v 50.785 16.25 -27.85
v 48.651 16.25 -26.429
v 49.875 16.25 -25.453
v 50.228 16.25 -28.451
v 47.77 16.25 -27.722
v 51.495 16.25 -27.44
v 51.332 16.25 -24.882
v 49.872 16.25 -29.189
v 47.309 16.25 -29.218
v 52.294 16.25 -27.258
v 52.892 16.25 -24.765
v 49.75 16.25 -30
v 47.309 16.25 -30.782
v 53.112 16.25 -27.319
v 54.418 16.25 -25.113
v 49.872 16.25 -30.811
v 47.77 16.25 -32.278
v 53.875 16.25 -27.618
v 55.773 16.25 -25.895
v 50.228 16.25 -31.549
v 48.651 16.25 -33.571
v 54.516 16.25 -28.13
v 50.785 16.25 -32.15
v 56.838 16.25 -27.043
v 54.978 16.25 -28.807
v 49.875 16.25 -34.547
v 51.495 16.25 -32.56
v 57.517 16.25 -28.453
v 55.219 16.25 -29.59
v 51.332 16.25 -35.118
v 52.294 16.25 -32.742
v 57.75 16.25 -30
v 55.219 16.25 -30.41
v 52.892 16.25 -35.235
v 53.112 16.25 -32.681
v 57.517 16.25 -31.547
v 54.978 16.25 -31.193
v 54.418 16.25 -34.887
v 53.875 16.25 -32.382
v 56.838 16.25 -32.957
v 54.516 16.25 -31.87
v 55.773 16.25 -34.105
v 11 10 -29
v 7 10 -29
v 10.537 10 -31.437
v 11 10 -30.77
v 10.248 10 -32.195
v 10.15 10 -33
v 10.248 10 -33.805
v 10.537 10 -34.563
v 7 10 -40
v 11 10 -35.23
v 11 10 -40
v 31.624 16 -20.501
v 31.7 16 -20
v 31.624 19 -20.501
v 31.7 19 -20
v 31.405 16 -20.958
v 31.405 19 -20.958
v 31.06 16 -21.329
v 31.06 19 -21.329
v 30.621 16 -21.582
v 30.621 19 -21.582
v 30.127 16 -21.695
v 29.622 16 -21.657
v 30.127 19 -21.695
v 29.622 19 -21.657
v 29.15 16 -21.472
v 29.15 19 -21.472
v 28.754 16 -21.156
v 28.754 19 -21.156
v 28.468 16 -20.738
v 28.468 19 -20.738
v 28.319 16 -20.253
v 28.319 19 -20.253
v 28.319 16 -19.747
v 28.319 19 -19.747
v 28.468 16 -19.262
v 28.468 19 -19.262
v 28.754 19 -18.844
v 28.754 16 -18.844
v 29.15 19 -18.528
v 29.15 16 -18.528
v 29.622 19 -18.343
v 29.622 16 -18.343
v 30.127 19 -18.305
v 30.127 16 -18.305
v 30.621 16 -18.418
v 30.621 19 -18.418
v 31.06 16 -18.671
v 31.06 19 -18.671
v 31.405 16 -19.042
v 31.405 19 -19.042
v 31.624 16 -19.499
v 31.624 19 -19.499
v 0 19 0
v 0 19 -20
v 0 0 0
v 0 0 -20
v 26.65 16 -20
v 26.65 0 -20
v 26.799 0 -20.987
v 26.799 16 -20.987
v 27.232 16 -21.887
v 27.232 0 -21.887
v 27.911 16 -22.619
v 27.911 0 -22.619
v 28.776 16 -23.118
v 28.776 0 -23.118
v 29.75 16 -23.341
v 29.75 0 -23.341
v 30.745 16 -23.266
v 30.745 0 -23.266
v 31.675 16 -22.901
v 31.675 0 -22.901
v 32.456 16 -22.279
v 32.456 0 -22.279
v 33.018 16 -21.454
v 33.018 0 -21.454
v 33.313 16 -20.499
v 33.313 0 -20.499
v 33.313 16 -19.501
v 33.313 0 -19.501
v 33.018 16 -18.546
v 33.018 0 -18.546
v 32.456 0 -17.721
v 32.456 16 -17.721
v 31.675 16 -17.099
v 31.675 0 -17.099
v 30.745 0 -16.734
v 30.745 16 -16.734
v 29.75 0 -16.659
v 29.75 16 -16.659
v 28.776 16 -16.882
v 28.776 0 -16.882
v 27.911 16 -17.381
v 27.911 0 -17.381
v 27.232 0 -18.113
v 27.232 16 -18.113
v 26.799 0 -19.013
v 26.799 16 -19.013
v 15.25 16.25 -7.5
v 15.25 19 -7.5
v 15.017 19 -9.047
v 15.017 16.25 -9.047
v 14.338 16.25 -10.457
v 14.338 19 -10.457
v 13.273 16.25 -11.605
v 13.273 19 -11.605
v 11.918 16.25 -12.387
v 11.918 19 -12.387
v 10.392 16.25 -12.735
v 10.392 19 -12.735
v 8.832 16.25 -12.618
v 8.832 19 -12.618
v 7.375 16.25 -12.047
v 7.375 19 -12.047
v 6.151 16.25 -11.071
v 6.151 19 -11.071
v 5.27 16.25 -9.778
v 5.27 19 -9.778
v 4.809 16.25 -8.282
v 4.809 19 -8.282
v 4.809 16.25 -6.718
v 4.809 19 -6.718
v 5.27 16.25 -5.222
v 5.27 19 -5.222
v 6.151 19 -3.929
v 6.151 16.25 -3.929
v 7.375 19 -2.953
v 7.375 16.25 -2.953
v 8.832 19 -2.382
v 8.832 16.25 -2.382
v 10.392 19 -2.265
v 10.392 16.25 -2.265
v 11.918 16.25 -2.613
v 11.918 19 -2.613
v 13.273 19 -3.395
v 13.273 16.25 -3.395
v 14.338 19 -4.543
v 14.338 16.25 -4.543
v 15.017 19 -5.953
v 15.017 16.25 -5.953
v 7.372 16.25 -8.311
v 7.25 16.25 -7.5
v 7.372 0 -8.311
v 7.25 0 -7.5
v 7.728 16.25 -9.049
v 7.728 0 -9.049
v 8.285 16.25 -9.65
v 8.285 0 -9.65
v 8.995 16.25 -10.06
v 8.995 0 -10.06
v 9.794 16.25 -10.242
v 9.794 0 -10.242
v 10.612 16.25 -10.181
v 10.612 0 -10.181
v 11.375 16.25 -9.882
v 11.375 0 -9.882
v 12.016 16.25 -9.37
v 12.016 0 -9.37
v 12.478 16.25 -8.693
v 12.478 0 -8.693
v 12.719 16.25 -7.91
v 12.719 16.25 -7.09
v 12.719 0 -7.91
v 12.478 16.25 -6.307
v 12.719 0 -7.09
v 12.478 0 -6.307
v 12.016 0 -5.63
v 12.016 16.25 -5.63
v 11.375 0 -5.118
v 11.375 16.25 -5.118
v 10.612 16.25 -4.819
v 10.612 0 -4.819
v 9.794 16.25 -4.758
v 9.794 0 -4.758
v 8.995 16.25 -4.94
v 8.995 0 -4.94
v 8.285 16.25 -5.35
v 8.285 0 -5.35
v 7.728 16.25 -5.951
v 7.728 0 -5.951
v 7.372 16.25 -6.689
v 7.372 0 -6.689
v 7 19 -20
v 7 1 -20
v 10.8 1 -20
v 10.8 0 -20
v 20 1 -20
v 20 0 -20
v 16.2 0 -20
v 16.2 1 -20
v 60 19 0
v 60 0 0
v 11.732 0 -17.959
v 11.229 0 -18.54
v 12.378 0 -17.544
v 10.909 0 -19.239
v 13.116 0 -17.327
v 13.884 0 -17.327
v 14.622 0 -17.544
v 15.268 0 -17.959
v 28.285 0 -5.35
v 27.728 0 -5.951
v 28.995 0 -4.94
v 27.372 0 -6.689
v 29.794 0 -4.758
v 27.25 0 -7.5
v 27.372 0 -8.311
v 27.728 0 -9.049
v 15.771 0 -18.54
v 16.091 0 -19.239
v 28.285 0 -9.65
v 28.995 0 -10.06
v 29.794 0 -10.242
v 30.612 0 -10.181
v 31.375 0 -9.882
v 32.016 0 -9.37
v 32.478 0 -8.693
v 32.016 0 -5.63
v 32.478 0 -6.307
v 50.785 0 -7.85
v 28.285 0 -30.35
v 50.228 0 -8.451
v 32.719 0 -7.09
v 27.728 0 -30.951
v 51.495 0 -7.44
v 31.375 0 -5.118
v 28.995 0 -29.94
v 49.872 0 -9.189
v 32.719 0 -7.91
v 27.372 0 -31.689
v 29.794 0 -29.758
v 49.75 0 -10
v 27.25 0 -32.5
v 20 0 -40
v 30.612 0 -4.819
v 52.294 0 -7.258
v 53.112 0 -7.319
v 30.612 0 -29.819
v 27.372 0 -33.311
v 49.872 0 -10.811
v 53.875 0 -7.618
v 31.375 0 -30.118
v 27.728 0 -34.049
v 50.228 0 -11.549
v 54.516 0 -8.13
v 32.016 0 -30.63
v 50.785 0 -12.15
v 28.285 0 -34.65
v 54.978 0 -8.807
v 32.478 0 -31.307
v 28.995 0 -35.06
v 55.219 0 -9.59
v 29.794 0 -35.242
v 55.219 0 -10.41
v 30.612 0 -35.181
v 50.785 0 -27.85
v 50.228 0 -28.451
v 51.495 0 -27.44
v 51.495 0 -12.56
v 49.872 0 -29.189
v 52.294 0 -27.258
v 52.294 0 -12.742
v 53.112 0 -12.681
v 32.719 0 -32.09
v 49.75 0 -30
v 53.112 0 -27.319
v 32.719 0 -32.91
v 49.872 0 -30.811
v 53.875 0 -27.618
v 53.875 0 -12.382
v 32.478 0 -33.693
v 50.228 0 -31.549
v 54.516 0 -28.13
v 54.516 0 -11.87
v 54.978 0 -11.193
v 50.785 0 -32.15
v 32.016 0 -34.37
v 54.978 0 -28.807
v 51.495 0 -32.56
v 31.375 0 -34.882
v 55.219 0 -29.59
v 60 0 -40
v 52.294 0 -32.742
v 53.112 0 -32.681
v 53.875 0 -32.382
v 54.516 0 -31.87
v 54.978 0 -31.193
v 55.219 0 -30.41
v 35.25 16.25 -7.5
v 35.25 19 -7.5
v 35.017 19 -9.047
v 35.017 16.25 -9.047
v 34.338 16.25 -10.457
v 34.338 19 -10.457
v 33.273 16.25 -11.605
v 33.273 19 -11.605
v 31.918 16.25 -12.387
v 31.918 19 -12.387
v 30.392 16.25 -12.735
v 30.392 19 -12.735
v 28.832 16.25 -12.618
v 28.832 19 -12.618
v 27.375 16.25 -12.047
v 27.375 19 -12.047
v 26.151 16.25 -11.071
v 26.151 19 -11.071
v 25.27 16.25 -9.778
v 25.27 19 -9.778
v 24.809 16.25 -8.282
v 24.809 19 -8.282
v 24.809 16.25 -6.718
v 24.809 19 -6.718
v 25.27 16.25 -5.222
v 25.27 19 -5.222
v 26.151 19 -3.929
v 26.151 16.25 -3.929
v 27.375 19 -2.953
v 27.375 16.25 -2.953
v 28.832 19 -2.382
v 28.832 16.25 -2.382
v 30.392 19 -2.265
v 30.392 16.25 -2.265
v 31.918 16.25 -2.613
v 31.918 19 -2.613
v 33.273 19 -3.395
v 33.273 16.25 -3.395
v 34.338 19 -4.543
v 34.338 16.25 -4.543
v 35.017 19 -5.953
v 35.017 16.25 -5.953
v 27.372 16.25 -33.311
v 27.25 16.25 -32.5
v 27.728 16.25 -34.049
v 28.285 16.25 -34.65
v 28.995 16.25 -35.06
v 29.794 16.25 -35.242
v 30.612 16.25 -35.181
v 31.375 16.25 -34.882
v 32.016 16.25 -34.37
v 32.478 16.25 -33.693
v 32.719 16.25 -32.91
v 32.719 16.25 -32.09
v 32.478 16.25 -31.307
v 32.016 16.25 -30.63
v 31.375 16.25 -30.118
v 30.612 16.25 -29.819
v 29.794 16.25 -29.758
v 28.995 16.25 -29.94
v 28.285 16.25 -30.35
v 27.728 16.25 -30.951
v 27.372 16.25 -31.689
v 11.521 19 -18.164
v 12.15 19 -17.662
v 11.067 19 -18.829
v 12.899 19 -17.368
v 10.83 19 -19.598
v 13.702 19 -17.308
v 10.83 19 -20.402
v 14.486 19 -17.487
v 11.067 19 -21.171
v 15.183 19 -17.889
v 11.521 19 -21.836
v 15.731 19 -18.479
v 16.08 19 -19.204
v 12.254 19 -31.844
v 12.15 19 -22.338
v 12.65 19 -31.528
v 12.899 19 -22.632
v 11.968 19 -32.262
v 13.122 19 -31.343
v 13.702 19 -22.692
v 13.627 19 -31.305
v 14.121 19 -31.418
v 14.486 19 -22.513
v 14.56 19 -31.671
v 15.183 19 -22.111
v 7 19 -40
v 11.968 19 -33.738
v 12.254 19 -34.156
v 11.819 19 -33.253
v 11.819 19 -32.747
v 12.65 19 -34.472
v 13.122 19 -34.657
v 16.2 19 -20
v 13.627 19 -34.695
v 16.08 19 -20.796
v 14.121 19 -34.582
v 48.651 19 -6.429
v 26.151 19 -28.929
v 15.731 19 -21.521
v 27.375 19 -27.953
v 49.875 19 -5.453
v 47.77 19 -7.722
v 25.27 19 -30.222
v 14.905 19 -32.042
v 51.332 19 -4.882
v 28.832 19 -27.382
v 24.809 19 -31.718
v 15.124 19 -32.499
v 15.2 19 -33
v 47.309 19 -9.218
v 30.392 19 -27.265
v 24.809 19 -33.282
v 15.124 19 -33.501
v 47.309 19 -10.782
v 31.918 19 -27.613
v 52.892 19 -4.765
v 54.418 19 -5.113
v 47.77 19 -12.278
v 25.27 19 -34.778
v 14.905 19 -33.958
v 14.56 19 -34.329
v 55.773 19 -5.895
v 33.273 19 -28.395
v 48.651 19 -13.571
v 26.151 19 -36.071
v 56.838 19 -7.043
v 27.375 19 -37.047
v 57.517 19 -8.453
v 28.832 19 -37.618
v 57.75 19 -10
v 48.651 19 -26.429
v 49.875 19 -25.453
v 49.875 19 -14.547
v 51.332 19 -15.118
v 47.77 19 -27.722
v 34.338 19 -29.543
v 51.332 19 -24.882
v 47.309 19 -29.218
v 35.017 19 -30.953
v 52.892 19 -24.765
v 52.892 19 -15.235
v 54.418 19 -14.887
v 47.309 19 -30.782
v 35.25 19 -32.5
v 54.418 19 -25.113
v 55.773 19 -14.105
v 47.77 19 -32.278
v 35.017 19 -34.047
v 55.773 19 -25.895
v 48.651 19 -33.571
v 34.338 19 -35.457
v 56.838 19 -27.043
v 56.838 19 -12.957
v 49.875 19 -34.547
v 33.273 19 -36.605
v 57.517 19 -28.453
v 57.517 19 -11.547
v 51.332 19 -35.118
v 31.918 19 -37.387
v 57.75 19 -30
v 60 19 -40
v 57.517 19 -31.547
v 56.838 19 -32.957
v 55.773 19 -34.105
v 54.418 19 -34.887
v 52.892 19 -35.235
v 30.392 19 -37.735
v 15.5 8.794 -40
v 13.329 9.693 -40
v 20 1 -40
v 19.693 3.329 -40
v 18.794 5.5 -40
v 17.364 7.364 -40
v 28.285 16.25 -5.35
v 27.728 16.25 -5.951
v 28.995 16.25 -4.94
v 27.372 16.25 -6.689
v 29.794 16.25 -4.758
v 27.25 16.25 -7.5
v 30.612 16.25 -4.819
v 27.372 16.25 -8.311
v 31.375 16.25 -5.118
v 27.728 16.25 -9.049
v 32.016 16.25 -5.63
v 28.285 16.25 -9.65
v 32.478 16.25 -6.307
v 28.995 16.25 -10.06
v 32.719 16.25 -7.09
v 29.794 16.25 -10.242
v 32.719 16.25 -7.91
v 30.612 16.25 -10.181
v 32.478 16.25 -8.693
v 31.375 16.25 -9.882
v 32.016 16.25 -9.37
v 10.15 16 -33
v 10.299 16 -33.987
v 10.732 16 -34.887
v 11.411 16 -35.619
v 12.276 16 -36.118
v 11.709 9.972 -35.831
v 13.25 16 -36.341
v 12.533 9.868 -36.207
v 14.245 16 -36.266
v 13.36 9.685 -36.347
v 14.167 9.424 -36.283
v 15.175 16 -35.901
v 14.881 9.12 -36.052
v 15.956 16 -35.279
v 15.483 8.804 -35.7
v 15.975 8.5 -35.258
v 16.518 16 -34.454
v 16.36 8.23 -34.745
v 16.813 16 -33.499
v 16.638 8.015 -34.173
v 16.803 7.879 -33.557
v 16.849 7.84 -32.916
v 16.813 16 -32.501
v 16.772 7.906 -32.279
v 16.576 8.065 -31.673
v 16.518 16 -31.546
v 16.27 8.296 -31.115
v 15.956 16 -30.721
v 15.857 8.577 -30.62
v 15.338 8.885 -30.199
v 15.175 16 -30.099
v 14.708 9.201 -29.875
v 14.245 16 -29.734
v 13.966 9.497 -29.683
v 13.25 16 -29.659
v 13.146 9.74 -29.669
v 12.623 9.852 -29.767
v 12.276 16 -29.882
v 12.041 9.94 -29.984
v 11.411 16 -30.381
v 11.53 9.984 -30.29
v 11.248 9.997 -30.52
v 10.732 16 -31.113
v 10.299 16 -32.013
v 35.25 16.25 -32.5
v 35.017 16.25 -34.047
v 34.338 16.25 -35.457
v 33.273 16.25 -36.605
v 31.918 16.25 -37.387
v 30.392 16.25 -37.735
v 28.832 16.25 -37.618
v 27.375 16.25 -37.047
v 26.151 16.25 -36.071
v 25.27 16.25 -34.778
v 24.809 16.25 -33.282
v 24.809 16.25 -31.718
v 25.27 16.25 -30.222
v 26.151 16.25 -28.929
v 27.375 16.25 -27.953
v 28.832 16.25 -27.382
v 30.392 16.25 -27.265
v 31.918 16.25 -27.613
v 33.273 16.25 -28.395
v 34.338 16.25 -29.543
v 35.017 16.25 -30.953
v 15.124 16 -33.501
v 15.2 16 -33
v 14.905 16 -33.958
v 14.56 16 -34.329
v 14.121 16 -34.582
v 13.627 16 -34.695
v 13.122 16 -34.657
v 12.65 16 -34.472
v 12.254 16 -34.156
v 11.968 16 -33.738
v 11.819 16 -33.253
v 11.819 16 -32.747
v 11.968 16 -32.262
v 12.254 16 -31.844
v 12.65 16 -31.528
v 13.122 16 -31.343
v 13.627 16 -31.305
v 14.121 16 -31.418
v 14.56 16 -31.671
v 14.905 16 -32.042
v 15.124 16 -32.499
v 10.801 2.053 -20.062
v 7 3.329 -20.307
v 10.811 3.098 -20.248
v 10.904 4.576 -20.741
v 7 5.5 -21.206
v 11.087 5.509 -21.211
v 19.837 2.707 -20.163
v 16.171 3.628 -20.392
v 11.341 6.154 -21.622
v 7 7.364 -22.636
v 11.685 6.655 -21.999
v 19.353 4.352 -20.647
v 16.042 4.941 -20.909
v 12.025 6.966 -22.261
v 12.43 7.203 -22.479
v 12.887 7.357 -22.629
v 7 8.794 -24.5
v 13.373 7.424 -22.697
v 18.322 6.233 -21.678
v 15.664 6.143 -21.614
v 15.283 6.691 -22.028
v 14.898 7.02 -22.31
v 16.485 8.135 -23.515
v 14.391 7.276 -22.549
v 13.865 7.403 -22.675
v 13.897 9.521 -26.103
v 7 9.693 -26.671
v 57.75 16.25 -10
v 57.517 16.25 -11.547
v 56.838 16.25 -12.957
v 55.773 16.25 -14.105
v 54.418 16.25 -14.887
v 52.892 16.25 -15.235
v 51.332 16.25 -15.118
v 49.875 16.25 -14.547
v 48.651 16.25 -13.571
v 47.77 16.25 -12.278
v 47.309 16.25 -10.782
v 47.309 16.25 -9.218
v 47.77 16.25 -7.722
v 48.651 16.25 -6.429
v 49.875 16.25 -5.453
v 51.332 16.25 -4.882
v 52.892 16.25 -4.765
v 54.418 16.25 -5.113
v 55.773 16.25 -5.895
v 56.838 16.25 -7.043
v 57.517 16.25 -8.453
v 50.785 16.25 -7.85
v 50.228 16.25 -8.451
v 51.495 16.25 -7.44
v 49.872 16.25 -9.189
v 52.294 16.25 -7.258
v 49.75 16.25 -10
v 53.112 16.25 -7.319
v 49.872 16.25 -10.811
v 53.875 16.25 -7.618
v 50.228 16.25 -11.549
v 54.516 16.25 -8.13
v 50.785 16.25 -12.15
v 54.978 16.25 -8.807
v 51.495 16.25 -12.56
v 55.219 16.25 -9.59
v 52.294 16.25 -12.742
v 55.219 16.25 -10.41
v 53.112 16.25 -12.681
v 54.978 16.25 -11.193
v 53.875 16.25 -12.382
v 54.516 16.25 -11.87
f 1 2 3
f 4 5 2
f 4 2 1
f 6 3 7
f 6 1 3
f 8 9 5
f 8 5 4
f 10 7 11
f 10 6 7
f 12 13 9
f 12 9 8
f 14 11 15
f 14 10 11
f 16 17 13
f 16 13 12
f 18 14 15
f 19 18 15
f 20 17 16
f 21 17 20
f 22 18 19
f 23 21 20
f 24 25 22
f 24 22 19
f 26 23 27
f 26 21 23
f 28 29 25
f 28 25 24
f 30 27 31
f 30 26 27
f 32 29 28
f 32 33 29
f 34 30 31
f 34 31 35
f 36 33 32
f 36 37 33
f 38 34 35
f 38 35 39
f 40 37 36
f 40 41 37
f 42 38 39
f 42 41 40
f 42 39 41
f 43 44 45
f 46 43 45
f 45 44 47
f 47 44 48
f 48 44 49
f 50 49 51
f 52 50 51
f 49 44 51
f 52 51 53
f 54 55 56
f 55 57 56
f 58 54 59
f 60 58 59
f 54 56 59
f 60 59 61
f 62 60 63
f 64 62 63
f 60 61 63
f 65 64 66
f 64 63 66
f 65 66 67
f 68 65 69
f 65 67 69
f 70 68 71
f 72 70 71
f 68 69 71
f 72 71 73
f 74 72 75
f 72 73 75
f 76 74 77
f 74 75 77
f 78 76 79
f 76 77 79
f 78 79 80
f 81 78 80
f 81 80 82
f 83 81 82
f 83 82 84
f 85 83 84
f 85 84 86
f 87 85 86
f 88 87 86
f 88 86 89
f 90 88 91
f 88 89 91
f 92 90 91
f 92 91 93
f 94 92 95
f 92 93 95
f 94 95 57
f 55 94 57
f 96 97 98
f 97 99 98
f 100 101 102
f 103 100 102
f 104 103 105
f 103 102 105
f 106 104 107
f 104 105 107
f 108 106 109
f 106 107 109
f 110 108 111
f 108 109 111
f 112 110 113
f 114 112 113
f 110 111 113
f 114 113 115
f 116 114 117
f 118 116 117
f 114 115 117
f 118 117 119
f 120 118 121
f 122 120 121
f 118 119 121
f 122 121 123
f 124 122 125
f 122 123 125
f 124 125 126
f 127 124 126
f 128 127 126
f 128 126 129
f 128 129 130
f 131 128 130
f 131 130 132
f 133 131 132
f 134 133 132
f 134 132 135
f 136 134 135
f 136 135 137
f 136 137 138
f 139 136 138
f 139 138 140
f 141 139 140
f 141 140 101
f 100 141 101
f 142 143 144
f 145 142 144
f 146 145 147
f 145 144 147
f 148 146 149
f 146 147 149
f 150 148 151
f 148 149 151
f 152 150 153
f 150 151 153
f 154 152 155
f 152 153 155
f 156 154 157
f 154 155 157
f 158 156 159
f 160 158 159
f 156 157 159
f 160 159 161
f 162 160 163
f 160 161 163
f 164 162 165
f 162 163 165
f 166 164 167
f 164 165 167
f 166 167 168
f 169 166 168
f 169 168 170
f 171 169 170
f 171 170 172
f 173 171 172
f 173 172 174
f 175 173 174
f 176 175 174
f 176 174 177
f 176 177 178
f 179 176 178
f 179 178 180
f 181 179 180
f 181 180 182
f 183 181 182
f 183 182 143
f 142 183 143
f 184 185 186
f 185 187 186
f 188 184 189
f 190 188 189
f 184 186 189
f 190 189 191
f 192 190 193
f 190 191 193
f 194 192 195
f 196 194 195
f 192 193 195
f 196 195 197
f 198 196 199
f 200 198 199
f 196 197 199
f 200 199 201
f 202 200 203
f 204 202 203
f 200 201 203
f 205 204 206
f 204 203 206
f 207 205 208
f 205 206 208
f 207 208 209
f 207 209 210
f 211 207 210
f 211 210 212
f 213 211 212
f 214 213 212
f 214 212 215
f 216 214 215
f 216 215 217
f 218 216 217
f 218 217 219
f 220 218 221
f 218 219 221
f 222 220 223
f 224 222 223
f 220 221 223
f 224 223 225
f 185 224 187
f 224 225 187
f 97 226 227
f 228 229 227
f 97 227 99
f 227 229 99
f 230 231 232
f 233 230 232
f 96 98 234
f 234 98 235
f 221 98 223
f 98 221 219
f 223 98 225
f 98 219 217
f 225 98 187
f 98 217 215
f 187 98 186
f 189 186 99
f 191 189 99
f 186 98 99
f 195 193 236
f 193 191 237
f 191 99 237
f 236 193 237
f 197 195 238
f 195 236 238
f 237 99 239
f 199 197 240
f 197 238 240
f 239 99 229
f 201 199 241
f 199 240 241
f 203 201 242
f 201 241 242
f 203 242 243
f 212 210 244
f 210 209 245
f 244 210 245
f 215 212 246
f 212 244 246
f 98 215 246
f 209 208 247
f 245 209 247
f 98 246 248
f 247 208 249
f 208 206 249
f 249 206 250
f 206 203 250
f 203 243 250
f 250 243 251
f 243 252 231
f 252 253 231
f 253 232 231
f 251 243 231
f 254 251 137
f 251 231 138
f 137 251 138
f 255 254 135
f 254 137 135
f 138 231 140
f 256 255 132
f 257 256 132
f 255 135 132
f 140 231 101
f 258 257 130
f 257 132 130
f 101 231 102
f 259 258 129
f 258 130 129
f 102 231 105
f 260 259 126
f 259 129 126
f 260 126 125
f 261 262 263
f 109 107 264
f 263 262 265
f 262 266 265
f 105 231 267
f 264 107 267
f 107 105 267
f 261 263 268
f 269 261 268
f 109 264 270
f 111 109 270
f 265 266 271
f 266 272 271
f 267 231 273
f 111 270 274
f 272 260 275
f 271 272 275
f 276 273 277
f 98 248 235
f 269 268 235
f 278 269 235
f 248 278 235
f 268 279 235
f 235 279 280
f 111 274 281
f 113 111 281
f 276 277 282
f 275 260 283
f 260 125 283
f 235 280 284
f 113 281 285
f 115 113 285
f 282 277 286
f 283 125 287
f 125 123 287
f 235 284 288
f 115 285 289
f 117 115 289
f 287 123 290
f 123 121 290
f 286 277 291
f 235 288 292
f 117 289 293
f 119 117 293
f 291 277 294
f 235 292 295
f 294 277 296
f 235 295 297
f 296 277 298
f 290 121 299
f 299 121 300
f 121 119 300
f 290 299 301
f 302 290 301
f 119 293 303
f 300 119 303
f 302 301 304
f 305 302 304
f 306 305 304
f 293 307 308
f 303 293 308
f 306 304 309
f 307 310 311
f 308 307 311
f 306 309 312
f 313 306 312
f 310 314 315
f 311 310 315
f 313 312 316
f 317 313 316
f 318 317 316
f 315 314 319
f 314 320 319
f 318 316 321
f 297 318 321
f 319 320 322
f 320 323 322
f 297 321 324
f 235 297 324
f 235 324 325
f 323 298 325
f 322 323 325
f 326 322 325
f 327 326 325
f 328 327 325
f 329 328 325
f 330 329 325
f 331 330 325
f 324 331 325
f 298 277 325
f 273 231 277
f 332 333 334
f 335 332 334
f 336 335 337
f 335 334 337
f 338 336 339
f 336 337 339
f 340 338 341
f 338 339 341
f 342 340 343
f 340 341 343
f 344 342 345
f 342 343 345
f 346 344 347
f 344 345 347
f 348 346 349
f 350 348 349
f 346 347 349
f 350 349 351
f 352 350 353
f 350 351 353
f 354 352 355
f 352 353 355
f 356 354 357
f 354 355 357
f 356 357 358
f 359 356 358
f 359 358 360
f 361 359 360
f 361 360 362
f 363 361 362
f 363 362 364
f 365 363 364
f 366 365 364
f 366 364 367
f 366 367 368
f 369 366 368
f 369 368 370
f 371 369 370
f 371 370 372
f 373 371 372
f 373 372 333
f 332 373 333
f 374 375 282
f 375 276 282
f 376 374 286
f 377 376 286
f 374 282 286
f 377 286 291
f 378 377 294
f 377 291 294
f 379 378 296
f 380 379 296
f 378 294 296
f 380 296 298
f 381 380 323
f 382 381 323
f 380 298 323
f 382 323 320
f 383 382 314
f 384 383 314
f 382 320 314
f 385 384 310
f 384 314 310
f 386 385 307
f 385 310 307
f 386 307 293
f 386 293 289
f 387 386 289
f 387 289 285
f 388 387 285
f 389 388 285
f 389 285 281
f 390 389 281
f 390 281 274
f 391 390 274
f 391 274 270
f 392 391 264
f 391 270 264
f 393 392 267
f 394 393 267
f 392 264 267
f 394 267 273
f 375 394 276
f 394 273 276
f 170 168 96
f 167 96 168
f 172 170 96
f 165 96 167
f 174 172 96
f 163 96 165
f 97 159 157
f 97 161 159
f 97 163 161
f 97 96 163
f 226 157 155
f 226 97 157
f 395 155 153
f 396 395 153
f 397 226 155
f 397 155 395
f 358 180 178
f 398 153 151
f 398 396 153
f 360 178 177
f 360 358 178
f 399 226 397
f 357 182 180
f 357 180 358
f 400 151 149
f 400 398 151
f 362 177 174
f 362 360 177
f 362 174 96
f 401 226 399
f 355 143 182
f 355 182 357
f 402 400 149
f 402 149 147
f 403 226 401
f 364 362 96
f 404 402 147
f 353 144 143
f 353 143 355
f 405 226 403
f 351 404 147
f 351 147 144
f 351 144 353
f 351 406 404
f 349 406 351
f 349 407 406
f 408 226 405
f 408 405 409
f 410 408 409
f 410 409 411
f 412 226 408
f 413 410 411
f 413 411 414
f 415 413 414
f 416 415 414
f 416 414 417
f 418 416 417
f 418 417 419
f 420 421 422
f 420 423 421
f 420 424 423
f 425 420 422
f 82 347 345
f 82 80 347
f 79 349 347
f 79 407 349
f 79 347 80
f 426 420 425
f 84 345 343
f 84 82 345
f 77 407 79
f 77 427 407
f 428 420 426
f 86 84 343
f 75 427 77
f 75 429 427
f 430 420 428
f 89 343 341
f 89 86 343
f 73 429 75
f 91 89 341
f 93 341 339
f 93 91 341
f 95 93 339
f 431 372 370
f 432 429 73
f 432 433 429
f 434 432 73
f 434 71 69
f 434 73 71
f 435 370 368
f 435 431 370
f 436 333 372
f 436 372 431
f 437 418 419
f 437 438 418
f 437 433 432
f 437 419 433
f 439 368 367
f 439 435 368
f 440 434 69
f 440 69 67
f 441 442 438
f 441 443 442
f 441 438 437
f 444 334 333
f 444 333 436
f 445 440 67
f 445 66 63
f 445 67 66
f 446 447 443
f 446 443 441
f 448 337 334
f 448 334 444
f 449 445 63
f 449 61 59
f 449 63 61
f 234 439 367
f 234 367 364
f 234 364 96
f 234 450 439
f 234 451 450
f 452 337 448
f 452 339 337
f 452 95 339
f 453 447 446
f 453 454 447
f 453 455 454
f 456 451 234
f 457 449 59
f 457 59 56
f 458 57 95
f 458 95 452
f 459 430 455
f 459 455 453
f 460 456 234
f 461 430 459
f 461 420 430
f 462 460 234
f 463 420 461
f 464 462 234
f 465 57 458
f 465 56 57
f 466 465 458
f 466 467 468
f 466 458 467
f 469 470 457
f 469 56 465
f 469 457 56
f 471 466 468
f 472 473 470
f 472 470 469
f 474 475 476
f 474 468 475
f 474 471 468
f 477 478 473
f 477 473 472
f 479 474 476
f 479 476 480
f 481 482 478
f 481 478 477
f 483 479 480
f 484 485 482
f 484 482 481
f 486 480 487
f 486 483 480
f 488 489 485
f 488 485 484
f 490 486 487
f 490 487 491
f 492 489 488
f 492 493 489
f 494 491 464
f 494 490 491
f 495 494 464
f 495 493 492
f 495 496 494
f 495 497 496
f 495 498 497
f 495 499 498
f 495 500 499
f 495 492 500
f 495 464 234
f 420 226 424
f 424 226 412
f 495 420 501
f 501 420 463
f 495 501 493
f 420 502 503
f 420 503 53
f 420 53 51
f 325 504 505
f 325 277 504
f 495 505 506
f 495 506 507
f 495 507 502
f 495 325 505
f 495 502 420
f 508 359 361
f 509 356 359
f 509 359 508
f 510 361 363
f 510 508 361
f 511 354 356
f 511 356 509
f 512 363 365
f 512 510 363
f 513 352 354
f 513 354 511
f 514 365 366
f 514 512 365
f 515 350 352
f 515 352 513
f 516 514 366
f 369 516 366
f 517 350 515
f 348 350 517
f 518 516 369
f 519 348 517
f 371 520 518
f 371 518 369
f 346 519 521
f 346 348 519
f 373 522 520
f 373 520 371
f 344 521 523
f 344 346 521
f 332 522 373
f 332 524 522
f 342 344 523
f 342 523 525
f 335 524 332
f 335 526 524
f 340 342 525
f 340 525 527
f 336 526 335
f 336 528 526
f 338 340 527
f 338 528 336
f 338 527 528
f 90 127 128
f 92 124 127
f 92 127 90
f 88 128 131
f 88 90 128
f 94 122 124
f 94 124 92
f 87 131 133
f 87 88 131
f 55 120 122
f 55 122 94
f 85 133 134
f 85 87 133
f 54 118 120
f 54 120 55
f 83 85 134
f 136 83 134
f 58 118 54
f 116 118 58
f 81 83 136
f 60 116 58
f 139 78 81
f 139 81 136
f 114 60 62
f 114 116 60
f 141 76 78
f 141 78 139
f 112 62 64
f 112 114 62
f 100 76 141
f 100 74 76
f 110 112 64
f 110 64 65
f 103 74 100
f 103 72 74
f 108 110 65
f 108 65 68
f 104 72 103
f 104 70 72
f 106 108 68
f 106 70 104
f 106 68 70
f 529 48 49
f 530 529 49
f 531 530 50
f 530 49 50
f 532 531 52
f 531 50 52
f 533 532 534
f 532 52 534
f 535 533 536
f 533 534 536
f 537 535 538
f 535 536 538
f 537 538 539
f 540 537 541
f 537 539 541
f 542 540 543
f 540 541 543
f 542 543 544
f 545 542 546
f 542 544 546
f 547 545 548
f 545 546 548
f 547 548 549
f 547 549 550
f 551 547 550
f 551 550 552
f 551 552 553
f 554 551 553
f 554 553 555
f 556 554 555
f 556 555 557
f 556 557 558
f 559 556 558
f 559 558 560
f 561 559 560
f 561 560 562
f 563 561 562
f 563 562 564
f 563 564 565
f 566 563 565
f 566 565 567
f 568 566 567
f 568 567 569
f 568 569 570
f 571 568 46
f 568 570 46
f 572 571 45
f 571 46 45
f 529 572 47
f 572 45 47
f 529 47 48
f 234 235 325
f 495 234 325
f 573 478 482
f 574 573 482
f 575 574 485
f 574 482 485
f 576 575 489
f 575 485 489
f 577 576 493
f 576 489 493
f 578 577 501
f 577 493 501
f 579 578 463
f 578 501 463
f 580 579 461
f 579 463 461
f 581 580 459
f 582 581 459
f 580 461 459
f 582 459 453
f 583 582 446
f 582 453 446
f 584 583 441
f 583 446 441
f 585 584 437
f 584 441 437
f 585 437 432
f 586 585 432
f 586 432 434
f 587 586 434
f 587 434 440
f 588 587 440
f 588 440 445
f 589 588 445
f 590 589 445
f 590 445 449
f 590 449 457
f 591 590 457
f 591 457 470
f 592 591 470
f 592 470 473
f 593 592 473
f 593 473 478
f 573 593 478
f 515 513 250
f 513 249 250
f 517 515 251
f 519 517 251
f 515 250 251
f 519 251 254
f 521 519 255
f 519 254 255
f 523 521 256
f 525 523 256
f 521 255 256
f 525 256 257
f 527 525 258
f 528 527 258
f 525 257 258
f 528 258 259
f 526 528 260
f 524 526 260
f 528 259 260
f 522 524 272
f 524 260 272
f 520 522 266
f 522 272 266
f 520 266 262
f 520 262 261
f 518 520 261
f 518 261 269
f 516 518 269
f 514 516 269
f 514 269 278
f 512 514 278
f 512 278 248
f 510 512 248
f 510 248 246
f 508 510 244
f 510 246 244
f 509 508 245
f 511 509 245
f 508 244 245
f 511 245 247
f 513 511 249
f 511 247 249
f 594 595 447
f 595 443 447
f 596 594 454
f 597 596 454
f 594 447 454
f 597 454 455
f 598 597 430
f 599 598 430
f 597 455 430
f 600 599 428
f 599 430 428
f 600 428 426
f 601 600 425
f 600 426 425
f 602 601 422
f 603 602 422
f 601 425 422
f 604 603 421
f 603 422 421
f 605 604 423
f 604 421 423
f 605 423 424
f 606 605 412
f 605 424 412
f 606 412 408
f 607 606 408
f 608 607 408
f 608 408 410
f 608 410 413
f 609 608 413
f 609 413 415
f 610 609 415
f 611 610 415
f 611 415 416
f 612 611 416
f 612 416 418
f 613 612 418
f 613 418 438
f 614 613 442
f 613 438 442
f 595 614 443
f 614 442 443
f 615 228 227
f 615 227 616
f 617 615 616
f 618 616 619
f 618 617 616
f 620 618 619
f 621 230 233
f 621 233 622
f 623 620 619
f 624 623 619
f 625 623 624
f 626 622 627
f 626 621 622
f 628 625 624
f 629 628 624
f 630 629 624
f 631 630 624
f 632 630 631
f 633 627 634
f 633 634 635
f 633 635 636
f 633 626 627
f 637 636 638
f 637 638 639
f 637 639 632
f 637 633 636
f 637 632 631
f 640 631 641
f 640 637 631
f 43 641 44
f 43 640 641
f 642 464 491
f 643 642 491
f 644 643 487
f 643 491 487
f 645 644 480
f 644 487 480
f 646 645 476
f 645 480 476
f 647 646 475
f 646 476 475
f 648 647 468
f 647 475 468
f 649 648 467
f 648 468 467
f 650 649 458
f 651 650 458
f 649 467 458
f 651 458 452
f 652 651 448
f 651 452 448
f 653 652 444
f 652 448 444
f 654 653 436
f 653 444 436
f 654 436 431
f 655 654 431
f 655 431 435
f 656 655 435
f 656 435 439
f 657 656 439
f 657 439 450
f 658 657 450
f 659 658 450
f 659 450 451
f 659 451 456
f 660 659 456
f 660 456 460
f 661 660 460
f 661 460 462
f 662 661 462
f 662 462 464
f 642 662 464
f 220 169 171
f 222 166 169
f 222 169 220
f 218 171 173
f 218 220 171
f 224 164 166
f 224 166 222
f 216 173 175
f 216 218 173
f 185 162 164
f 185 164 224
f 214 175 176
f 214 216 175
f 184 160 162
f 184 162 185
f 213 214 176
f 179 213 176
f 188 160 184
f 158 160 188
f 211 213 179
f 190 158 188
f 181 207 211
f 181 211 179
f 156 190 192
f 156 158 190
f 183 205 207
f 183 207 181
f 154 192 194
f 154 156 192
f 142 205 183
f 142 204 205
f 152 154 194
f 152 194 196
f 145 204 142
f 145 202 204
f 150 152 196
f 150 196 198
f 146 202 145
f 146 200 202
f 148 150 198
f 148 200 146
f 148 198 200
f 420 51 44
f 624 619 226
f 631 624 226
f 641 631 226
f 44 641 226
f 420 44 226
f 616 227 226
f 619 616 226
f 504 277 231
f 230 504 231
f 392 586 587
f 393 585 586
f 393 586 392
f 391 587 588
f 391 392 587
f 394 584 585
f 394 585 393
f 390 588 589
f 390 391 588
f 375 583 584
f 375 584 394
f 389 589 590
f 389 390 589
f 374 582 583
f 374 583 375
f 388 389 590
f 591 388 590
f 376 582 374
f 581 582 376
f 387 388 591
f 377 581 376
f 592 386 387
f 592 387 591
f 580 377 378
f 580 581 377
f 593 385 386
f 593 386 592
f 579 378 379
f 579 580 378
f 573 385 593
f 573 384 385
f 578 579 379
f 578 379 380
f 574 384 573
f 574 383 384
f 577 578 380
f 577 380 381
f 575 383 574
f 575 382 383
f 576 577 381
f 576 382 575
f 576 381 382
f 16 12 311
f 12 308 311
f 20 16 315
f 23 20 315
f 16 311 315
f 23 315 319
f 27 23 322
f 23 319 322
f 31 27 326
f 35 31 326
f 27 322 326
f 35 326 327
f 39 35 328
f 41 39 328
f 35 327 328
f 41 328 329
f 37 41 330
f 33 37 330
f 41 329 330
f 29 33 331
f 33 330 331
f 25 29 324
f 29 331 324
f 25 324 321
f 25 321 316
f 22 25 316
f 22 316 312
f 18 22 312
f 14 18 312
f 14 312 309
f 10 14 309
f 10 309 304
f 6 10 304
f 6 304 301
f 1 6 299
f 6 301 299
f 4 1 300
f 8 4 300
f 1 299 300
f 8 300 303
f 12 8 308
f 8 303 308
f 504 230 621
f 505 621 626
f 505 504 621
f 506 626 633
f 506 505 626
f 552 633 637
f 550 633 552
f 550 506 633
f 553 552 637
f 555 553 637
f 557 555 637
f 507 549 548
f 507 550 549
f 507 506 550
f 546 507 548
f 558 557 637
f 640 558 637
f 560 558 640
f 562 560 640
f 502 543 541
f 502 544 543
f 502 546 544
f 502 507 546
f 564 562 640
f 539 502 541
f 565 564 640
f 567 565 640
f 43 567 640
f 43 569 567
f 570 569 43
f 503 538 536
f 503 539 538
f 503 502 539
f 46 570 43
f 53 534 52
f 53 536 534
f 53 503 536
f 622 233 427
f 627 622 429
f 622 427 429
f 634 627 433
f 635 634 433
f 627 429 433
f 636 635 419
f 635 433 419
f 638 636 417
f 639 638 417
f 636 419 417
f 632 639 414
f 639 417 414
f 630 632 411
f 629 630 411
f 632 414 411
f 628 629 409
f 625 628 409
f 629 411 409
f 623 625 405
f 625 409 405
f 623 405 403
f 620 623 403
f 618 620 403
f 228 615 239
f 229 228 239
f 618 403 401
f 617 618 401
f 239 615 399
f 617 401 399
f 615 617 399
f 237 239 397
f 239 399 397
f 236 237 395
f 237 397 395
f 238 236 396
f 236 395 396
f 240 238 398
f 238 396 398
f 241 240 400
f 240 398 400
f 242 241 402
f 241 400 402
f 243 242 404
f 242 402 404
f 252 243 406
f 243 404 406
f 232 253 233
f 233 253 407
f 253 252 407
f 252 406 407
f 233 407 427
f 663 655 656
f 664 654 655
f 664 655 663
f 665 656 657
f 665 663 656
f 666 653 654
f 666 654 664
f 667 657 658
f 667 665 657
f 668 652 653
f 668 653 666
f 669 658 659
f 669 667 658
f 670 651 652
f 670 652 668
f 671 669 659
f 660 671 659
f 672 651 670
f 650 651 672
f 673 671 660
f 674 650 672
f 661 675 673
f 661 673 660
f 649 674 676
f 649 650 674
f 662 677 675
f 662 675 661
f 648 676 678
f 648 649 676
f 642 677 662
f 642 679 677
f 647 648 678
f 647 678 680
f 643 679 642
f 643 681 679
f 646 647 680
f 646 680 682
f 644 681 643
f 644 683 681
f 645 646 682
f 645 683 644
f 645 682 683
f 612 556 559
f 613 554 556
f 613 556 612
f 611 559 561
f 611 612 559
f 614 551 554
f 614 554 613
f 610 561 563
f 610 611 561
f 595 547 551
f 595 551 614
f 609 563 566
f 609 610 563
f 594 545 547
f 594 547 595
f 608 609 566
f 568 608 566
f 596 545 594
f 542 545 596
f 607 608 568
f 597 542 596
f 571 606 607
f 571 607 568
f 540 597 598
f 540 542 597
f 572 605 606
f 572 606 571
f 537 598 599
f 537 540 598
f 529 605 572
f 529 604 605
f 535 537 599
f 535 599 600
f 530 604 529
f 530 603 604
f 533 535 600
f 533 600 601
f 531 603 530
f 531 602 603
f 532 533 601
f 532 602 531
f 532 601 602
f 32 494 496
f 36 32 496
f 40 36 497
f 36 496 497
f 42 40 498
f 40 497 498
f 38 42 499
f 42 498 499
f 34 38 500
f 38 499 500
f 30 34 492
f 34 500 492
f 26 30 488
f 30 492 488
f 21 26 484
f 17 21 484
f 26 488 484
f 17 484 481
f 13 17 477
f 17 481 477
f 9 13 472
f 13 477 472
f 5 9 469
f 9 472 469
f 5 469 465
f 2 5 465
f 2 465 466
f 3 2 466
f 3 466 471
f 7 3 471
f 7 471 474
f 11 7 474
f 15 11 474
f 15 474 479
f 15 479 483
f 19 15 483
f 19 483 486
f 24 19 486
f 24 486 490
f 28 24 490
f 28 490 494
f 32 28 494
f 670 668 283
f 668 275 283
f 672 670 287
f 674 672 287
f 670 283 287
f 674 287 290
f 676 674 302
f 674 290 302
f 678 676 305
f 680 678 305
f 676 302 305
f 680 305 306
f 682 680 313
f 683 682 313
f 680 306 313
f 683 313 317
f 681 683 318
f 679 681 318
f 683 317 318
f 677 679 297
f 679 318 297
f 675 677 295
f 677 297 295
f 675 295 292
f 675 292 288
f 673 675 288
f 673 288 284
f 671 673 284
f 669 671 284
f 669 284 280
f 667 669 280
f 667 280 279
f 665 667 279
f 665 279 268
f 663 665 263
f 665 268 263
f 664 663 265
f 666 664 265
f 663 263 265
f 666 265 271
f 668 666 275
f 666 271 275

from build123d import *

# Parameters (mm, degrees)
BOSS_EXTRUDE1_DEPTH             = 10
BOSS_EXTRUDE2_DEPTH             = 9
CBORE_FOR_M5_SBHCS1_D           = 5.5
CBORE_FOR_M5_SBHCS1_CBORE_D     = 10.5
CBORE_FOR_M5_SBHCS1_CBORE_DEPTH = 2.75
CBORE_FOR_M5_SBHCS2_D           = 5.5
CBORE_FOR_M5_SBHCS2_CBORE_D     = 10.5
CBORE_FOR_M5_SBHCS2_CBORE_DEPTH = 2.75
CBORE_FOR_M3_SBHCS1_D           = 3.4
CBORE_FOR_M3_SBHCS1_CBORE_D     = 6.7
CBORE_FOR_M3_SBHCS1_CBORE_DEPTH = 16
CBORE_FOR_M3_SBHCS2_D           = 3.4
CBORE_FOR_M3_SBHCS2_CBORE_D     = 6.7
CBORE_FOR_M3_SBHCS2_CBORE_DEPTH = 6
F_5_4_5_4_DIAMETER_HOLE1_D      = 5.4
FILLET3_R                       = 9


with BuildPart() as part:
    # Sketch1 → Boss-Extrude1 (new body)
    with BuildSketch(Plane(origin=(0, 0, 0), x_dir=(1, 0, 0), z_dir=(0, 1, 0))):
        Polygon((0, 0), (60, 0), (60, 40), (20, 40), (20, 20), (0, 20), align=None)
    extrude(amount=BOSS_EXTRUDE1_DEPTH)

    # Sketch2 → Boss-Extrude2 (add)
    with BuildSketch(Plane(origin=(0, 10, 0), x_dir=(1, 0, 0), z_dir=(0, 1, 0))):
        Polygon((20, 40), (7, 40), (7, 20), (0, 20), (0, 0), (60, 0), (60, 40), align=None)
    extrude(amount=BOSS_EXTRUDE2_DEPTH)

    # CBORE for M5 SBHCS1 (through all)
    with Locations(Plane(origin=(0, 19, 0), x_dir=(1, 0, 0), z_dir=(0, 1, 0))):
        with Locations((10, 7.5), (30, 7.5), (30, 32.5)):
            CounterBoreHole(CBORE_FOR_M5_SBHCS1_D / 2, CBORE_FOR_M5_SBHCS1_CBORE_D / 2, CBORE_FOR_M5_SBHCS1_CBORE_DEPTH)

    # CBORE for M5 SBHCS2 (through all)
    with Locations(Plane(origin=(0, 19, 0), x_dir=(1, 0, 0), z_dir=(0, 1, 0))):
        with Locations((52.5, 30), (52.5, 10)):
            CounterBoreHole(CBORE_FOR_M5_SBHCS2_D / 2, CBORE_FOR_M5_SBHCS2_CBORE_D / 2, CBORE_FOR_M5_SBHCS2_CBORE_DEPTH)

    # CBORE for M3 SBHCS1 (through all)
    with Locations(Plane(origin=(0, 0, 0), x_dir=(-1, 0, 0), z_dir=(0, -1, 0))):
        with Locations((-30, 20)):
            CounterBoreHole(CBORE_FOR_M3_SBHCS1_D / 2, CBORE_FOR_M3_SBHCS1_CBORE_D / 2, CBORE_FOR_M3_SBHCS1_CBORE_DEPTH)

    # CBORE for M3 SBHCS2 (through all)
    with Locations(Plane(origin=(0, 10, 0), x_dir=(-1, 0, 0), z_dir=(0, -1, 0))):
        with Locations((-13.5, 33)):
            CounterBoreHole(CBORE_FOR_M3_SBHCS2_D / 2, CBORE_FOR_M3_SBHCS2_CBORE_D / 2, CBORE_FOR_M3_SBHCS2_CBORE_DEPTH)

    # Ø5.4 (5.4) Diameter Hole1 (through all)
    with Locations(Plane(origin=(0, 0, 0), x_dir=(-1, 0, 0), z_dir=(0, -1, 0))):
        with Locations((-13.5, 20)):
            Hole(F_5_4_5_4_DIAMETER_HOLE1_D / 2)

    # Fillet3
    # the kernel refuses this fillet: 9 mm, written as the material it adds along each edge
    with BuildSketch(Plane(origin=(20, 10, -40), x_dir=(0, -1, 0), z_dir=(0, 0, 1))) as fillet3_piece_1_section:
        with BuildLine():
            CenterArc((FILLET3_R, -FILLET3_R), FILLET3_R, 90, 90)
            Line((0, -FILLET3_R), (0, 0))
            Line((0, 0), (FILLET3_R, 0))
        make_face()
    fillet3_piece_1 = extrude(amount=20, mode=Mode.PRIVATE)
    fillet3_piece_1 = fillet3_piece_1 - Plane(origin=(13.5, 7.877517224, -20), x_dir=(1, 0, 0), z_dir=(0, 1, 0)) * Cylinder(2.7, 76, mode=Mode.PRIVATE)
    fillet3_piece_1 = fillet3_piece_1 - Plane(origin=(13.5, 7.877517224, -33), x_dir=(-1, 0, 0), z_dir=(0, -1, 0)) * Cylinder(3.35, 76, mode=Mode.PRIVATE)
    add(fillet3_piece_1)
    with BuildSketch(Plane(origin=(33.3, 10, -20), x_dir=(0, -1, 0), z_dir=(-1, 0, 0))) as fillet3_piece_2_section:
        with BuildLine():
            CenterArc((FILLET3_R, -FILLET3_R), FILLET3_R, 90, 90)
            Line((0, -FILLET3_R), (0, 0))
            Line((0, 0), (FILLET3_R, 0))
        make_face()
    fillet3_piece_2 = extrude(amount=26.3, mode=Mode.PRIVATE)
    fillet3_piece_2 = fillet3_piece_2 - Plane(origin=(13.5, 3.343699997, -20), x_dir=(1, 0, 0), z_dir=(0, 1, 0)) * Cylinder(2.7, 89, mode=Mode.PRIVATE)
    fillet3_piece_2 = split(fillet3_piece_2, bisect_by=Plane(origin=(20, 3.343699997, -20.253192533), z_dir=(-1, 0, 0)), keep=Keep.TOP, mode=Mode.PRIVATE)
    add(fillet3_piece_2)


solid = part.part
